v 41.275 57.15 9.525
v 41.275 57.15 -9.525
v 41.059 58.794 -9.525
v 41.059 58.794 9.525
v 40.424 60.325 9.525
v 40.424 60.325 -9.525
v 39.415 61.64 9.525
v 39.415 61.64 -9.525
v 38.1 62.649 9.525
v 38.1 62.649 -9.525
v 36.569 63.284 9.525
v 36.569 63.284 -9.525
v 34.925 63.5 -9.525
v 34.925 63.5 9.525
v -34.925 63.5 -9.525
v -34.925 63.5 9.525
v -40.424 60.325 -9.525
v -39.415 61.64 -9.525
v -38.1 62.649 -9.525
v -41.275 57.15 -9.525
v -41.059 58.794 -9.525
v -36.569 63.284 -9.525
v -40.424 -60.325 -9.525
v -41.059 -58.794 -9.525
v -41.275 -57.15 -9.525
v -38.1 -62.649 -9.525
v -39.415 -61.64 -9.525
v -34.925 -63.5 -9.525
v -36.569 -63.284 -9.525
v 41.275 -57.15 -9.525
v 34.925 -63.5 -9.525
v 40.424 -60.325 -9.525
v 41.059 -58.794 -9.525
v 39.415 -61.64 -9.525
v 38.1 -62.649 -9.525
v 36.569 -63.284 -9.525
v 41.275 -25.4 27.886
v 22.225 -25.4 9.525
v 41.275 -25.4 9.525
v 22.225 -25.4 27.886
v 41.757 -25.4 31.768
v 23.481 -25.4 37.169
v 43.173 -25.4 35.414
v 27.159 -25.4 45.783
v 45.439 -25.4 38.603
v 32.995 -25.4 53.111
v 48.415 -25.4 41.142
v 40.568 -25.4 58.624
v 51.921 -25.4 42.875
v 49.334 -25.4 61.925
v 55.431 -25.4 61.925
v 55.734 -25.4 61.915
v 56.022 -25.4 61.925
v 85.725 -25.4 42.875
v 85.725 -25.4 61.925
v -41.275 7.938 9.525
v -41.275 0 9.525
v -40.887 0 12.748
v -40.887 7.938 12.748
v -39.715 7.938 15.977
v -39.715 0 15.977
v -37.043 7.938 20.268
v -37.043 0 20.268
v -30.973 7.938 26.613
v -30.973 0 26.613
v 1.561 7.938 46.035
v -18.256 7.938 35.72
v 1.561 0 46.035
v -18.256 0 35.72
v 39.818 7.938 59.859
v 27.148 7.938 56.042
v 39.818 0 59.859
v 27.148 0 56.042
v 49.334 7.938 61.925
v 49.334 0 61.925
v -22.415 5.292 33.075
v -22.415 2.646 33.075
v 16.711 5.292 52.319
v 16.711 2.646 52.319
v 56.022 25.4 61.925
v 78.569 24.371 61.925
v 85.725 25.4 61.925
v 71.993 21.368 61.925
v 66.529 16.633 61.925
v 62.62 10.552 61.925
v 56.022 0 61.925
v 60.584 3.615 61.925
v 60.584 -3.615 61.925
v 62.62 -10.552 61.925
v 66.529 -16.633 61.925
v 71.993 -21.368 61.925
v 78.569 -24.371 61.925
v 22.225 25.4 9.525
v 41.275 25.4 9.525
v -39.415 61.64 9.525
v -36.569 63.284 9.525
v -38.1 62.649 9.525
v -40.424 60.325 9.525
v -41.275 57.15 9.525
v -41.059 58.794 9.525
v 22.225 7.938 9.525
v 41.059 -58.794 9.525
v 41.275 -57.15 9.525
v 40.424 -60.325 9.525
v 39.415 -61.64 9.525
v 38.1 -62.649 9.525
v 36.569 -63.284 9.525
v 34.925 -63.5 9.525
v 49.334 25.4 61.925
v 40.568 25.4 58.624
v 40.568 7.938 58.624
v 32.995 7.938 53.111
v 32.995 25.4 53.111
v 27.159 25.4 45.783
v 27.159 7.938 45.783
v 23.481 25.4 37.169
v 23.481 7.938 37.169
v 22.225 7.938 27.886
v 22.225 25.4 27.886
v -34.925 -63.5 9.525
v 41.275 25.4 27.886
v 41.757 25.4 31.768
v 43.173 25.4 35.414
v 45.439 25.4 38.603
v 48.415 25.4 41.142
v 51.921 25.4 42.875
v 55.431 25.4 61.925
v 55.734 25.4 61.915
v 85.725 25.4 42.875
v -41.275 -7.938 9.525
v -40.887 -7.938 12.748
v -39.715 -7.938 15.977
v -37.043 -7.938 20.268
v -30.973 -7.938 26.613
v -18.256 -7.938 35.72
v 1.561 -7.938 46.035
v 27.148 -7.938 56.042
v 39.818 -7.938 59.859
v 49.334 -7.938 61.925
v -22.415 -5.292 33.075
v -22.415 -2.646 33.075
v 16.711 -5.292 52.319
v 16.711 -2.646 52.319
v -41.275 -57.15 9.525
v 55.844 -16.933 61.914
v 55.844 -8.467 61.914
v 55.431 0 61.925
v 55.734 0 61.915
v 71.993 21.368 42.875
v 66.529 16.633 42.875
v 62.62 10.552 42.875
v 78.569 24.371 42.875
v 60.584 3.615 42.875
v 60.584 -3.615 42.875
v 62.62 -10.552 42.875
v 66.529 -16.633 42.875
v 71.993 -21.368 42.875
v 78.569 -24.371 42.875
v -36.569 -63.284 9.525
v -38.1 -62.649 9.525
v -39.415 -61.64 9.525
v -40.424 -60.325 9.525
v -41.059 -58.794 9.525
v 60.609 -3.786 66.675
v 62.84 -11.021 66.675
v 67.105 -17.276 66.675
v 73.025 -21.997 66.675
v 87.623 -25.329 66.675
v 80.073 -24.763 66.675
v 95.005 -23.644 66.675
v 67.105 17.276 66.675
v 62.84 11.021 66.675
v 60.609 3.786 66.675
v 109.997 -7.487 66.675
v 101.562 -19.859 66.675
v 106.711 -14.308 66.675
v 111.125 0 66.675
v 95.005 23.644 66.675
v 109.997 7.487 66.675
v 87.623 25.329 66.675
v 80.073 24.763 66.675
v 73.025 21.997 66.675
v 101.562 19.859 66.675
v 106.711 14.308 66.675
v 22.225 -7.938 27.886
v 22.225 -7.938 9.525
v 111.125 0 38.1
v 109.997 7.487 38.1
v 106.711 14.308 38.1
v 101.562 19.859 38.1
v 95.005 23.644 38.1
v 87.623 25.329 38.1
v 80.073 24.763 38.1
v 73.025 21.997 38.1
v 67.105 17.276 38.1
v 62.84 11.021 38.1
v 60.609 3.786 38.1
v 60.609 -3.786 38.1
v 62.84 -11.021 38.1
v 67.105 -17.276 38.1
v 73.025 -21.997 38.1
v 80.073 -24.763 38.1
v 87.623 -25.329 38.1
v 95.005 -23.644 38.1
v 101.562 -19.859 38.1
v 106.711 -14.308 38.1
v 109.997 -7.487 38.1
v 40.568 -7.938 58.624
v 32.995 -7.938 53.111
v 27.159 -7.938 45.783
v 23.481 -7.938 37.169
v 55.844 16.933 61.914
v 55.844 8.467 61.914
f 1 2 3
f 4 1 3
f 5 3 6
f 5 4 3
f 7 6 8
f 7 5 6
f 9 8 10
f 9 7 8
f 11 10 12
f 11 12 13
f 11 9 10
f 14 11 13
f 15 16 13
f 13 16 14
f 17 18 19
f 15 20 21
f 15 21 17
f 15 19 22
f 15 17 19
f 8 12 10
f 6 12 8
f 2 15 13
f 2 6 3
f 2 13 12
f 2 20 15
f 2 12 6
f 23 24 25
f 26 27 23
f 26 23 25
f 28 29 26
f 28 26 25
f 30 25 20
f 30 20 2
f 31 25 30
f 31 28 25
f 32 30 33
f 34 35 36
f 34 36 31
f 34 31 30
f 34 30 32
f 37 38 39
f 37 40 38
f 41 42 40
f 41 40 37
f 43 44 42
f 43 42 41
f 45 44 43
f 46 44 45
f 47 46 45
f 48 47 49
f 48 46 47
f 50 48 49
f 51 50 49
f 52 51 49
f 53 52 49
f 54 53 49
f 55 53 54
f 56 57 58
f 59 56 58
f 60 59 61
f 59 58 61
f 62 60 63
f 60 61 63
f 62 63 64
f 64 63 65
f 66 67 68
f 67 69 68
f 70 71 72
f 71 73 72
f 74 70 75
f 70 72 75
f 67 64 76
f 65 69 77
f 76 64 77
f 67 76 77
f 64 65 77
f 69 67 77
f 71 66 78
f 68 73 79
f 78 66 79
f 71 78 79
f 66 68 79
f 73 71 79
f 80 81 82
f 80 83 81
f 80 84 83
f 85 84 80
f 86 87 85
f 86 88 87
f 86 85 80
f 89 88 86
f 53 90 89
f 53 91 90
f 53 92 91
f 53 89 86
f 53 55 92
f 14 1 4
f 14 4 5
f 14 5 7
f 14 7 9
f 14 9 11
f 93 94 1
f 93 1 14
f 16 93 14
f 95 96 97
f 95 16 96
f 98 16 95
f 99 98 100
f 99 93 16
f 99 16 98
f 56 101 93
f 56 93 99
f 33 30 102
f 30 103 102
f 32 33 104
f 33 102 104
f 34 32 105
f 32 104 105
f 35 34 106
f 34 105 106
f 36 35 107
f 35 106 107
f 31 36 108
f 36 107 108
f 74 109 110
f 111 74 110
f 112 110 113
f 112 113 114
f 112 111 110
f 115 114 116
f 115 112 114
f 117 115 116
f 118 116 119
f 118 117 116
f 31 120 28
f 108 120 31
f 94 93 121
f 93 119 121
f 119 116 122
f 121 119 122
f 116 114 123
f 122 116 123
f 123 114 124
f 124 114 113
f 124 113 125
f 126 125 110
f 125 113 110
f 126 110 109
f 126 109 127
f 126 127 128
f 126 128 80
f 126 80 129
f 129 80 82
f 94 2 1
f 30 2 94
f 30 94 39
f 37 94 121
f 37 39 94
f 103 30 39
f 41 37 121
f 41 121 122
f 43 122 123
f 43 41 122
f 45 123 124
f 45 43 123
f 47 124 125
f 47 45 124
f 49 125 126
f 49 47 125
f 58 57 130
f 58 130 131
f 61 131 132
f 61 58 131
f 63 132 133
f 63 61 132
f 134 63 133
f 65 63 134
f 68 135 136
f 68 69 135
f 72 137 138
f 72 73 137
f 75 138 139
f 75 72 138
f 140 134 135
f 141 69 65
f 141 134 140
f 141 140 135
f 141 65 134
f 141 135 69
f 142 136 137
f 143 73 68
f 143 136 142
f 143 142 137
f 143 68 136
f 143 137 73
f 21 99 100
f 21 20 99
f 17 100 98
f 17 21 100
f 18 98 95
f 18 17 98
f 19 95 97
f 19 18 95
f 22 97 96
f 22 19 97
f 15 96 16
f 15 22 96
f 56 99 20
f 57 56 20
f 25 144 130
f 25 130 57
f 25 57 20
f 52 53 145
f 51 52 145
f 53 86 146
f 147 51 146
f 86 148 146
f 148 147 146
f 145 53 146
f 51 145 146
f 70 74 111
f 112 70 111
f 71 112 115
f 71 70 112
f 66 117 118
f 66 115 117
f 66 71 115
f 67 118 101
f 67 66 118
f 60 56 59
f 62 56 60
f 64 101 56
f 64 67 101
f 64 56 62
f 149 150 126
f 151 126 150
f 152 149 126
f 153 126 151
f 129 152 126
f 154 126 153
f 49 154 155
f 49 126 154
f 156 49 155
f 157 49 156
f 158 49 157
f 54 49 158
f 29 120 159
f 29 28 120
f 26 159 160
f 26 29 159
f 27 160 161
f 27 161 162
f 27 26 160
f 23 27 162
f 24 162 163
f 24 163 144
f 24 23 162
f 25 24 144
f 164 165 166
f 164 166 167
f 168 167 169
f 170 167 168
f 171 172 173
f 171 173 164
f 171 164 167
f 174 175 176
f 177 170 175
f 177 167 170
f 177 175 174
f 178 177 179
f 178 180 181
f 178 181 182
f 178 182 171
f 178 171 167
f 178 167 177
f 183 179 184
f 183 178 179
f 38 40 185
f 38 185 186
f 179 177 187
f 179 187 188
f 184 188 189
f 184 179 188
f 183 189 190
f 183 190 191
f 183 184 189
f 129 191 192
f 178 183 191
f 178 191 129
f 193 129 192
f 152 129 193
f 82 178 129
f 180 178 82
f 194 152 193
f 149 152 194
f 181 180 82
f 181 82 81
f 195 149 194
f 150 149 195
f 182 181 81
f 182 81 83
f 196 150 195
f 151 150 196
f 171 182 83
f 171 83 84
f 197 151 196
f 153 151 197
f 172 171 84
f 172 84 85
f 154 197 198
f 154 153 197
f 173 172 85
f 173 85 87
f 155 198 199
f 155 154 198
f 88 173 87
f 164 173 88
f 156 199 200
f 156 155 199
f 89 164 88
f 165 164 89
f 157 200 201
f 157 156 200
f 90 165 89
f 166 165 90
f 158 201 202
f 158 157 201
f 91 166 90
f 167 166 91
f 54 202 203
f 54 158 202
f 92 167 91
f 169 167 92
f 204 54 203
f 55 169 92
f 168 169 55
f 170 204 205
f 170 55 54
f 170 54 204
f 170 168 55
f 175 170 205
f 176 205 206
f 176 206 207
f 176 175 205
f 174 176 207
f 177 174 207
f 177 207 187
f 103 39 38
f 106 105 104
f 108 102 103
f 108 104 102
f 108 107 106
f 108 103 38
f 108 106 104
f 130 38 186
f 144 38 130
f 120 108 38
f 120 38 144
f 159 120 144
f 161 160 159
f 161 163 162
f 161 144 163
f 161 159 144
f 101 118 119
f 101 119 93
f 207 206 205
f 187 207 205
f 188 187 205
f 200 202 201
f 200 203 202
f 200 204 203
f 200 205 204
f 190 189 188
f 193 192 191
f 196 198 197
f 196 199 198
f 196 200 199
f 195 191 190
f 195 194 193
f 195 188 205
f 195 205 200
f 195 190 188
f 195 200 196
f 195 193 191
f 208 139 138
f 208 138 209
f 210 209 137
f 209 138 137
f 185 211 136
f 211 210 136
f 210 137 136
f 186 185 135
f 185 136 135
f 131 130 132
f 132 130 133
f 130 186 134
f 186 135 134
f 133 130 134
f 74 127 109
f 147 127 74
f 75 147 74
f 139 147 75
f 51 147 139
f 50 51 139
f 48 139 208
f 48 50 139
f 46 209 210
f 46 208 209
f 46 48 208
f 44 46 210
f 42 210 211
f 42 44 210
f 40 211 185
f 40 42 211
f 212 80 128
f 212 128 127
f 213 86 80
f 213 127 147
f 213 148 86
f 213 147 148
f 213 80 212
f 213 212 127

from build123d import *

# Parameters (mm, degrees)
F1_DEPTH = 63.5
F0_W     = 25.4
F0_H     = 19.05
F2_DEPTH = 25.4
F3_DEPTH = 7.9375
F5_R     = 6.35


with BuildPart() as f1:
    # F0 (on Front) → F1 (new body, symmetric)
    with BuildSketch(Plane.XZ):
        Polygon((-41.275, 9.525), (-41.275, -9.525), (41.275, -9.525), (41.275, 9.525), (22.225, 9.525), align=None)
    extrude(amount=F1_DEPTH, both=True)

    # F0 (on Front) → F2 (join, symmetric)
    with BuildSketch(Plane.XZ):
        with BuildLine():
            Line((22.225, 9.525), (41.275, 9.525))
            Line((41.275, 9.525), (41.275, 27.8859981267))
            ThreePointArc((41.275, 27.8859981267), (44.2074063081, 37.078652451), (51.9212857985, 42.8752))
            Line((51.9212857985, 42.8752), (60.325, 42.8752))
            Line((60.325, 42.8752), (60.325, 61.9252))
            Line((60.325, 61.9252), (56.0216490022, 61.9252))
            add(Edge.make_bspline(
                [(56.0216490022, 61.9252), (55.893919841, 61.9013716142), (55.5783651285, 61.9228608195), (55.4305035678, 61.9252)],
                knots=[0.9415521493, 0.9415521493, 0.9415521493, 0.9415521493, 0.9942623024, 0.9942623024, 0.9942623024, 0.9942623024], degree=3))
            Line((55.4305035678, 61.9252), (55.3886373275, 61.9252))
            Line((55.3886373275, 61.9252), (49.3340956488, 61.9252))
            ThreePointArc((49.3340956488, 61.9252), (29.8303542806, 49.6435849131), (22.225, 27.8859981267))
            Line((22.225, 27.8859981267), (22.225, 9.525))
        make_face()
        with Locations((73.025, 52.4002)):
            Rectangle(F0_W, F0_H)
    extrude(amount=F2_DEPTH, both=True)

    # F0 (on Front) → F3 (join, symmetric)
    with BuildSketch(Plane.XZ):
        with BuildLine():
            add(Edge.make_bspline(
                [(-41.275, 9.525), (-41.4724777652, 33.4488657069), (28.8867726716, 58.916791613), (49.3340956488, 61.9252)],
                knots=[0, 0, 0, 0, 0.7515772095, 0.7515772095, 0.7515772095, 0.7515772095], degree=3))
            Line((-41.275, 9.525), (22.225, 9.525))
            Line((22.225, 9.525), (22.225, 27.8859981267))
            ThreePointArc((22.225, 27.8859981267), (29.8303542806, 49.6435849131), (49.3340956488, 61.9252))
        make_face()
    extrude(amount=F3_DEPTH, both=True)

    # F0 (on Front) → F4 (revolve)
    with BuildSketch(Plane.XZ):
        Polygon((85.725, 66.675), (85.725, 61.9252), (85.725, 42.8752), (85.725, 38.1), (111.125, 38.1), (111.125, 66.675), align=None)
    revolve(axis=Axis((85.725, 0, 50.0126), (0, 0, 1)))

    # F5
    f5_edges = [f1.edges().sort_by_distance(p)[0] for p in [
        (-41.275, -63.5, 0),
        (41.275, -63.5, 0),
        (41.275, 63.5, 0),
        (-41.275, 63.5, 0),
    ]]
    fillet(f5_edges, radius=F5_R)


solid = f1.part
